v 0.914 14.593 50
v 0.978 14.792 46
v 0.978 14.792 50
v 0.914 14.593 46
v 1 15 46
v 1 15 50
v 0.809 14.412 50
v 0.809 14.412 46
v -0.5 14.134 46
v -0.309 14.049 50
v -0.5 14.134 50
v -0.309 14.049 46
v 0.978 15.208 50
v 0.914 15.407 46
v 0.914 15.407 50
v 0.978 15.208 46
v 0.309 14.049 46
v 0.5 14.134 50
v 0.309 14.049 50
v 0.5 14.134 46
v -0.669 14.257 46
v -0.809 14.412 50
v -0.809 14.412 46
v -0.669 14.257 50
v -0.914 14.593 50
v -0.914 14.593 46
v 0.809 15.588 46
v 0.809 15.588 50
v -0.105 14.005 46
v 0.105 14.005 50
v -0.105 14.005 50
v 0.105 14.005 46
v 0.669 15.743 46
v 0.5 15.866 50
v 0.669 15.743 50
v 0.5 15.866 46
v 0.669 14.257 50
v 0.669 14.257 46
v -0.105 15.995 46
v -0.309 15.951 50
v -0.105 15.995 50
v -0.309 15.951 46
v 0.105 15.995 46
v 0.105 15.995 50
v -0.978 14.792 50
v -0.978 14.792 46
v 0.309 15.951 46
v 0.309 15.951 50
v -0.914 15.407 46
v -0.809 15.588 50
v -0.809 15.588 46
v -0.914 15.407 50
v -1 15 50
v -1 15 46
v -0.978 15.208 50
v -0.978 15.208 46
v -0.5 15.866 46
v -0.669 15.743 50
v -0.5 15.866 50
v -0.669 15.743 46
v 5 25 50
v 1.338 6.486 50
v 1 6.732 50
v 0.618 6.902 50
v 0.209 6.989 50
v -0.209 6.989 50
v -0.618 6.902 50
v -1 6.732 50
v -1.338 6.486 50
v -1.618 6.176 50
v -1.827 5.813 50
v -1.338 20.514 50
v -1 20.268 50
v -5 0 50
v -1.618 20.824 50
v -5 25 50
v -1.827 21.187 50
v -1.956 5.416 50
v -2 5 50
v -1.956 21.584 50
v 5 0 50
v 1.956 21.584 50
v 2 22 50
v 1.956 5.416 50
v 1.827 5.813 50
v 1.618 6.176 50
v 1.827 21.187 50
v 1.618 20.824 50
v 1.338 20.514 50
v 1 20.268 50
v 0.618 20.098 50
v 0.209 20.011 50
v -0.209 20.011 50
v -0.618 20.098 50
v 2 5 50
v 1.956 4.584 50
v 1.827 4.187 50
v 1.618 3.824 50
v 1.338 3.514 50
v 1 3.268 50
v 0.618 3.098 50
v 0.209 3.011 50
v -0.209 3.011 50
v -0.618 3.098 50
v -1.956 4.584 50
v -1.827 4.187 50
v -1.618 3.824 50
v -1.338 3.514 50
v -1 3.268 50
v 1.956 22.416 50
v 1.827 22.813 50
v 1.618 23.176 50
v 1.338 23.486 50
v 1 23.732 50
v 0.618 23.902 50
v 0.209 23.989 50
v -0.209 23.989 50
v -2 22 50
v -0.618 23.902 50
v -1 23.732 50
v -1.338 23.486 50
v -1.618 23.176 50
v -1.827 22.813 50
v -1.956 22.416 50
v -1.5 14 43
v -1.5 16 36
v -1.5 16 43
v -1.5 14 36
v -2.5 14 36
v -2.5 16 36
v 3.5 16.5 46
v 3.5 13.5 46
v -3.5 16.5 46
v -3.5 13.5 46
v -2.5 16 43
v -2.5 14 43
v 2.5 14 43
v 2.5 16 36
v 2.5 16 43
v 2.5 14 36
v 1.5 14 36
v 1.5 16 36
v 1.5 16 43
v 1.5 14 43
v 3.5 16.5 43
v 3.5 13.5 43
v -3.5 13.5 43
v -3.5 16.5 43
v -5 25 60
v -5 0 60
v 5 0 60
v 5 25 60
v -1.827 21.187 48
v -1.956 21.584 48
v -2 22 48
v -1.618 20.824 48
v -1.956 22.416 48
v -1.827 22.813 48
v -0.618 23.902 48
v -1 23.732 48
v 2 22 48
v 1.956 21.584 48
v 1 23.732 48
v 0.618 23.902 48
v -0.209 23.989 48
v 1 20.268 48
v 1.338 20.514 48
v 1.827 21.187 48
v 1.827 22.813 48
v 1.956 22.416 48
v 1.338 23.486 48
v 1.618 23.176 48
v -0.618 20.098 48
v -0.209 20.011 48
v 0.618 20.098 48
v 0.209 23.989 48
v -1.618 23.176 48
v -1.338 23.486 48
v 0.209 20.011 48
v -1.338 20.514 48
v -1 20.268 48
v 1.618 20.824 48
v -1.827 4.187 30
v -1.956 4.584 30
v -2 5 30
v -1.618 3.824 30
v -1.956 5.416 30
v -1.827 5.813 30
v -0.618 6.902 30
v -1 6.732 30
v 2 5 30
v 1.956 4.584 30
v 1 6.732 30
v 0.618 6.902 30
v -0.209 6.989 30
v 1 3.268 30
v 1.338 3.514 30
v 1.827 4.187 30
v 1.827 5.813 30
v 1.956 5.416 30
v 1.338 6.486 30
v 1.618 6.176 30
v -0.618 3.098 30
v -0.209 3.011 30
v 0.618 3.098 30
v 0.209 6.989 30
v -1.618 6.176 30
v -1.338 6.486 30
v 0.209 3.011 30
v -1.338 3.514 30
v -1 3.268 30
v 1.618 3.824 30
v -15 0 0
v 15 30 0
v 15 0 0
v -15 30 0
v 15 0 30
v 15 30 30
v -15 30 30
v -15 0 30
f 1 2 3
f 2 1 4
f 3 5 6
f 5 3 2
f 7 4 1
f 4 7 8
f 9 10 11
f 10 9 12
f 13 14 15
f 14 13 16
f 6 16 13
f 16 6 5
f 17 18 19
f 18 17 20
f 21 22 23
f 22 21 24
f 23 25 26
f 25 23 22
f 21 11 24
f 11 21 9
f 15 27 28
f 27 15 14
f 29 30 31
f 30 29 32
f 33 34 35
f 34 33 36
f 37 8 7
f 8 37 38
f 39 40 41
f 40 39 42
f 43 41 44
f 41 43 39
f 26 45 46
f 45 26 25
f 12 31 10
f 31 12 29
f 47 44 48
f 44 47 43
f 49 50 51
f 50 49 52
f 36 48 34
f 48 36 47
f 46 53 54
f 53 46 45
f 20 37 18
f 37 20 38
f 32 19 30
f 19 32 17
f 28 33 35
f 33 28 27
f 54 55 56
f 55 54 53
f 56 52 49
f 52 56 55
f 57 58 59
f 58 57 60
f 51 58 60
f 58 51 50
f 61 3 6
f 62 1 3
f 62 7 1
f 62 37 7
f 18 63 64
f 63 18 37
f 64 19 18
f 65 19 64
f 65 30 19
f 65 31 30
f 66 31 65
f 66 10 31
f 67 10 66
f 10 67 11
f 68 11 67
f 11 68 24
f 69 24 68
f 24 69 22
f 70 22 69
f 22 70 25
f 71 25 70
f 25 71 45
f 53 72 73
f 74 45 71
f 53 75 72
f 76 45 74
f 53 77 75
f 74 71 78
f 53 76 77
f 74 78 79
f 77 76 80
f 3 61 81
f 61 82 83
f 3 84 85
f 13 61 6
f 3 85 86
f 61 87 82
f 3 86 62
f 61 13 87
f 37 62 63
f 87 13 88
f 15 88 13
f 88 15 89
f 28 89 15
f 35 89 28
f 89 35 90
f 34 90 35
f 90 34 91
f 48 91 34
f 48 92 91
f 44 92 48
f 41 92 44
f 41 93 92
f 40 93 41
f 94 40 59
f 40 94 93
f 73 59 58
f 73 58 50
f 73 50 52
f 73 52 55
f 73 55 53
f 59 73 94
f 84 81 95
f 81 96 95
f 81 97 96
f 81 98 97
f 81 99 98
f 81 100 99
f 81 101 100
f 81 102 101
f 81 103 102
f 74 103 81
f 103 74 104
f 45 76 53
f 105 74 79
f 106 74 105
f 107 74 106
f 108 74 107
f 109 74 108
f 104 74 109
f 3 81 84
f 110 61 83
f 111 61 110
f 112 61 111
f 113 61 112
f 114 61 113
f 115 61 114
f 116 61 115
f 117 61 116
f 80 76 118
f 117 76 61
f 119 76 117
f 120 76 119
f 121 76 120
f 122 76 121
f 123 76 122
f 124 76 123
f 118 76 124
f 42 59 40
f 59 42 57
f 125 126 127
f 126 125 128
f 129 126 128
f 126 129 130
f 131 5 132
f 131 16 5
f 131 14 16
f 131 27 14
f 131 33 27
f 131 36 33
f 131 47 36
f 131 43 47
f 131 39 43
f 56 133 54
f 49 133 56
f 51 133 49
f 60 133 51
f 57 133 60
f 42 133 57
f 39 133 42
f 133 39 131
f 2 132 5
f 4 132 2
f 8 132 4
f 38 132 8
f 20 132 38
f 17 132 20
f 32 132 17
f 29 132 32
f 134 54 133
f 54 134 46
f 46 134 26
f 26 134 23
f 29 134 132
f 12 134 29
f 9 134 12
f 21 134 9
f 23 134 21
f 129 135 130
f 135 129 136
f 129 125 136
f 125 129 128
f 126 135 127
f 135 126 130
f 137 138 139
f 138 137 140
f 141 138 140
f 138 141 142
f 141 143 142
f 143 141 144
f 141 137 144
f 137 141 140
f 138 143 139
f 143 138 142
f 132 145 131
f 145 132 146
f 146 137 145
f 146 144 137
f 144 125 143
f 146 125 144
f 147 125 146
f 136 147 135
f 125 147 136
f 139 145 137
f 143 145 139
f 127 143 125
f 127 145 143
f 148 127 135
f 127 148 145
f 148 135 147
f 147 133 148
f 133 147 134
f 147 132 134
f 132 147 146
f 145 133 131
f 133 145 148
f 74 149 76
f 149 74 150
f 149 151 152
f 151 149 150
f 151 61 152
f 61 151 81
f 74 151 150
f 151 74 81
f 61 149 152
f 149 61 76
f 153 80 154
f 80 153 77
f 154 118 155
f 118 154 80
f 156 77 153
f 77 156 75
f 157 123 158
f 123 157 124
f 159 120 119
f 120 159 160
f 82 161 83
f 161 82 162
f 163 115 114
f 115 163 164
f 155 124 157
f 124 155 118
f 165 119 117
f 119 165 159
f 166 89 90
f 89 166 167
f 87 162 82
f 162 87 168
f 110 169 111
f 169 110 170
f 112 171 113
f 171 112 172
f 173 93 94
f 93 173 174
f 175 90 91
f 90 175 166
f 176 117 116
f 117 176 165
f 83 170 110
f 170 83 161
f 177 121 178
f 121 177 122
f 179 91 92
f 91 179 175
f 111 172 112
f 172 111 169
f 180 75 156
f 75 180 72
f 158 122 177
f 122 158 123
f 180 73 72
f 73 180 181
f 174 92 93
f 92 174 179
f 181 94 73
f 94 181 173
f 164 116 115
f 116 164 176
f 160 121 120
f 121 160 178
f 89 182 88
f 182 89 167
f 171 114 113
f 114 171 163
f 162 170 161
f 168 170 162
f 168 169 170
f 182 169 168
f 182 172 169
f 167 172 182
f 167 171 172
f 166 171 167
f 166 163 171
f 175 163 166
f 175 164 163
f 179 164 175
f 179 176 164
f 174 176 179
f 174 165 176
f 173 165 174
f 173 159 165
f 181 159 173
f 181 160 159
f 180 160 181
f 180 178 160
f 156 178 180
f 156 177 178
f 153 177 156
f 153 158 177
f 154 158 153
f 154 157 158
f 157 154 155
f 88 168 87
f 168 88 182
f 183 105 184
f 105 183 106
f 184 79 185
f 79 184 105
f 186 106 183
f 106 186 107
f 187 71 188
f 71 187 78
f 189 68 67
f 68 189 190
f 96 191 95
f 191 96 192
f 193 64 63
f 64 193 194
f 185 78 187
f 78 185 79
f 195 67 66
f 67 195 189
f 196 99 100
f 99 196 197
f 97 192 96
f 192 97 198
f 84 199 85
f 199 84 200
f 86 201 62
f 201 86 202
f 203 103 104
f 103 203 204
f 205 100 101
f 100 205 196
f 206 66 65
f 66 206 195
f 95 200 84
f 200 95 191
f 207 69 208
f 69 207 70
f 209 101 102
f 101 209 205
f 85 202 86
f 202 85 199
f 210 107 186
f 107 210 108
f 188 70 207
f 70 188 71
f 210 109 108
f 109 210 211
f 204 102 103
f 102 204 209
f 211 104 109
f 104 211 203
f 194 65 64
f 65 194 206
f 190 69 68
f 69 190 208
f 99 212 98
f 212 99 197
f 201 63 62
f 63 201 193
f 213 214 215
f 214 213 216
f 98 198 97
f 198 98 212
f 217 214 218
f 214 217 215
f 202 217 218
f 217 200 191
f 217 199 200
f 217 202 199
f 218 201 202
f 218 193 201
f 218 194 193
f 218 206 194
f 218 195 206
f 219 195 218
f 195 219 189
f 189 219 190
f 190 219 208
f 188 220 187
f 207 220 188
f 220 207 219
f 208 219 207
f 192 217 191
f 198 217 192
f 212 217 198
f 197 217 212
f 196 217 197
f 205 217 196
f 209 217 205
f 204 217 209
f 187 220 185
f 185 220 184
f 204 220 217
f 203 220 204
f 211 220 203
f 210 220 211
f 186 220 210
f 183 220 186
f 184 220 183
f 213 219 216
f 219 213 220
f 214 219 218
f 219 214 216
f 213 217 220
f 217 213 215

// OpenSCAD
$fs=0.01;
    head_w = 10;
    head_h = 10;
    head_d = 25;
finger_w = 1;
finger_h = 10;
finger_d = 2;

module null(){
translate ([0, 0, 50*sin($t*360)])
{
translate ([-5, -3, 50-10]){
    cube([10, 25, 10]);
    cylinder(h=50, r=2);
}
translate ([0, 0, 0])
cylinder(h=50, r=2);
}
}


module camera(){
    cylinder(h=2, r=2);
}

module head(w, d, h){
    translate ([-w/2, 0, 0])
    cube([head_w, head_d, head_h]);
    
}

module hand(){
    rotate([0,-180,0])
    translate([0,0,4]){
    translate([0, 0, -4])
    cylinder(h=5, r=1);
    translate([-2.5, -1, 0])
    cube([finger_w, finger_d, finger_h]);
    translate([1.5, -1, 0])
    cube([finger_w, finger_d, finger_h]);
    translate([-3.5, -1.5, 0])
    cube([7, 3, 3]);  
    }  
}

module head_module(t){
    translate([0, head_d,0]){
    rotate([0, 0,180]){
    
    head(head_w, head_d, head_h);
    translate ([0,3, -2])
    color("RED")camera();
    translate ([0,10, 0])
    color("GRAY")hand();
    translate ([0,20, -50])
    cylinder(h=50, r=2);
    
    }
    }
}
translate ([0, 0, 50+20*sin($t*180)])
head_module(sin($t*180));
translate([-15,0,0])
cube([30, 30, 30]);
